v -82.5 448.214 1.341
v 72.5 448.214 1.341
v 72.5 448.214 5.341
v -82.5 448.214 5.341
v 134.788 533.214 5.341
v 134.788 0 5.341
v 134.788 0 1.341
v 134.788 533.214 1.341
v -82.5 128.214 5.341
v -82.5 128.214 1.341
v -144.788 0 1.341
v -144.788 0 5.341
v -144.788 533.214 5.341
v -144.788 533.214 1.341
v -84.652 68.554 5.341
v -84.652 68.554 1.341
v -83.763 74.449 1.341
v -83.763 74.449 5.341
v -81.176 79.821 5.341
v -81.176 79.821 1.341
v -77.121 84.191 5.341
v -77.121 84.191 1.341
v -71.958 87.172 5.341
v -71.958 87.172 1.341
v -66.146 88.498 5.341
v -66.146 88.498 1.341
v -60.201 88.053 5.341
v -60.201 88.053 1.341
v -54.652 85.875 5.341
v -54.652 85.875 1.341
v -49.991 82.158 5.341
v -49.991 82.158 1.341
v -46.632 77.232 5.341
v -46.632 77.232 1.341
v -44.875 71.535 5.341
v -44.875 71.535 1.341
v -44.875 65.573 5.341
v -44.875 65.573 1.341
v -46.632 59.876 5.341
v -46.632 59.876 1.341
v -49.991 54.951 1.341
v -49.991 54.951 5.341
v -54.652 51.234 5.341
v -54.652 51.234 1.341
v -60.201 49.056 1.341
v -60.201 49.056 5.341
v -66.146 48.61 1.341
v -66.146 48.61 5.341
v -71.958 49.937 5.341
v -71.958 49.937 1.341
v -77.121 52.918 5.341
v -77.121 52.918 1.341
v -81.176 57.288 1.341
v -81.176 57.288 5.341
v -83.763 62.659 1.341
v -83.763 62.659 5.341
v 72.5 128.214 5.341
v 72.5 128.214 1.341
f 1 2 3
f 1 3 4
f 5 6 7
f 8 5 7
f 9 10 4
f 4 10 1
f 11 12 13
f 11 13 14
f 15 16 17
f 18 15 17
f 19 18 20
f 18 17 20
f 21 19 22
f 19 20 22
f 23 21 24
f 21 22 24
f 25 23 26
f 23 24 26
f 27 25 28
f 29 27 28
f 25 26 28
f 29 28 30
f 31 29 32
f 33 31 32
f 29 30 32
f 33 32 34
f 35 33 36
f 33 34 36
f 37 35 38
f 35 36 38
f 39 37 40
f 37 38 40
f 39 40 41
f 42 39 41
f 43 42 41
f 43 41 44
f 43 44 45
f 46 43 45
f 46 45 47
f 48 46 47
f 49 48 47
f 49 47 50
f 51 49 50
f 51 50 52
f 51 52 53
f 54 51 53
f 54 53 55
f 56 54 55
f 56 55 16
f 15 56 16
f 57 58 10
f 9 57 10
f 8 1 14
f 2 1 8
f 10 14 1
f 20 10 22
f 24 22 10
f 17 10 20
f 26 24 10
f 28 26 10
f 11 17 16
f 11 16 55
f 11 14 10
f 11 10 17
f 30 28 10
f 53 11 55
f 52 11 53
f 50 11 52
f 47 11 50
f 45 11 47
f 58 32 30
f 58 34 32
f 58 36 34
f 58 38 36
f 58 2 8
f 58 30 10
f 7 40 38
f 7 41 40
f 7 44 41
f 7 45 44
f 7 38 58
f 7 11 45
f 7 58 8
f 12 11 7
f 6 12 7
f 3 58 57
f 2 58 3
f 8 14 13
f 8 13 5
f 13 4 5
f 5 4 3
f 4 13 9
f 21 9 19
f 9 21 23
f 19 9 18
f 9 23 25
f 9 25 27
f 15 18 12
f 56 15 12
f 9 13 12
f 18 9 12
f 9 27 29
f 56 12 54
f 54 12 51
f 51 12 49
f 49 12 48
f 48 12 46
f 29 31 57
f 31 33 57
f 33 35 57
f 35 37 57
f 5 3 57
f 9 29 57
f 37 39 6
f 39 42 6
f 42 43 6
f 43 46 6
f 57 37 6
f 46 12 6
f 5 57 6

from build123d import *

# Parameters (mm, degrees)
SKETCH_1_W          = 279.576527547
SKETCH_1_H          = 4
EXTRUDE_1_DEPTH     = 533.213673317
SKETCH_2_R          = 20
CUT_EXTRUDE_1_DEPTH = 553.536377523
SKETCH1_W           = 155
SKETCH1_H           = 320
CUT_EXTRUDE1_DEPTH  = 553.536377523


with BuildPart() as part:
    # Эскиз1 → Вытянуть1 (new body)
    with BuildSketch(Plane(origin=(0, 0, 0), x_dir=(1, 0, 0), z_dir=(0, 1, 0))):
        with Locations((-4.999950783, -3.341392103)):
            Rectangle(SKETCH_1_W, SKETCH_1_H)
    extrude(amount=EXTRUDE_1_DEPTH)

    # Эскиз2 → Вырез-Вытянуть1 (cut, through all)
    with BuildSketch(Plane(origin=(0, 0, 1.341392103), x_dir=(-1, 0, 0), z_dir=(0, 0, -1))):
        with Locations((64.651566286, 68.554150891)):
            Circle(SKETCH_2_R)
    extrude(amount=-CUT_EXTRUDE_1_DEPTH, mode=Mode.SUBTRACT)

    # Sketch1 → Cut-Extrude1 (cut, through all)
    with BuildSketch(Plane(origin=(0, 0, 1.341392103), x_dir=(-1, 0, 0), z_dir=(0, 0, -1))):
        with Locations((4.999950782, 288.213673317)):
            Rectangle(SKETCH1_W, SKETCH1_H)
    extrude(amount=-CUT_EXTRUDE1_DEPTH, mode=Mode.SUBTRACT)


solid = part.part
